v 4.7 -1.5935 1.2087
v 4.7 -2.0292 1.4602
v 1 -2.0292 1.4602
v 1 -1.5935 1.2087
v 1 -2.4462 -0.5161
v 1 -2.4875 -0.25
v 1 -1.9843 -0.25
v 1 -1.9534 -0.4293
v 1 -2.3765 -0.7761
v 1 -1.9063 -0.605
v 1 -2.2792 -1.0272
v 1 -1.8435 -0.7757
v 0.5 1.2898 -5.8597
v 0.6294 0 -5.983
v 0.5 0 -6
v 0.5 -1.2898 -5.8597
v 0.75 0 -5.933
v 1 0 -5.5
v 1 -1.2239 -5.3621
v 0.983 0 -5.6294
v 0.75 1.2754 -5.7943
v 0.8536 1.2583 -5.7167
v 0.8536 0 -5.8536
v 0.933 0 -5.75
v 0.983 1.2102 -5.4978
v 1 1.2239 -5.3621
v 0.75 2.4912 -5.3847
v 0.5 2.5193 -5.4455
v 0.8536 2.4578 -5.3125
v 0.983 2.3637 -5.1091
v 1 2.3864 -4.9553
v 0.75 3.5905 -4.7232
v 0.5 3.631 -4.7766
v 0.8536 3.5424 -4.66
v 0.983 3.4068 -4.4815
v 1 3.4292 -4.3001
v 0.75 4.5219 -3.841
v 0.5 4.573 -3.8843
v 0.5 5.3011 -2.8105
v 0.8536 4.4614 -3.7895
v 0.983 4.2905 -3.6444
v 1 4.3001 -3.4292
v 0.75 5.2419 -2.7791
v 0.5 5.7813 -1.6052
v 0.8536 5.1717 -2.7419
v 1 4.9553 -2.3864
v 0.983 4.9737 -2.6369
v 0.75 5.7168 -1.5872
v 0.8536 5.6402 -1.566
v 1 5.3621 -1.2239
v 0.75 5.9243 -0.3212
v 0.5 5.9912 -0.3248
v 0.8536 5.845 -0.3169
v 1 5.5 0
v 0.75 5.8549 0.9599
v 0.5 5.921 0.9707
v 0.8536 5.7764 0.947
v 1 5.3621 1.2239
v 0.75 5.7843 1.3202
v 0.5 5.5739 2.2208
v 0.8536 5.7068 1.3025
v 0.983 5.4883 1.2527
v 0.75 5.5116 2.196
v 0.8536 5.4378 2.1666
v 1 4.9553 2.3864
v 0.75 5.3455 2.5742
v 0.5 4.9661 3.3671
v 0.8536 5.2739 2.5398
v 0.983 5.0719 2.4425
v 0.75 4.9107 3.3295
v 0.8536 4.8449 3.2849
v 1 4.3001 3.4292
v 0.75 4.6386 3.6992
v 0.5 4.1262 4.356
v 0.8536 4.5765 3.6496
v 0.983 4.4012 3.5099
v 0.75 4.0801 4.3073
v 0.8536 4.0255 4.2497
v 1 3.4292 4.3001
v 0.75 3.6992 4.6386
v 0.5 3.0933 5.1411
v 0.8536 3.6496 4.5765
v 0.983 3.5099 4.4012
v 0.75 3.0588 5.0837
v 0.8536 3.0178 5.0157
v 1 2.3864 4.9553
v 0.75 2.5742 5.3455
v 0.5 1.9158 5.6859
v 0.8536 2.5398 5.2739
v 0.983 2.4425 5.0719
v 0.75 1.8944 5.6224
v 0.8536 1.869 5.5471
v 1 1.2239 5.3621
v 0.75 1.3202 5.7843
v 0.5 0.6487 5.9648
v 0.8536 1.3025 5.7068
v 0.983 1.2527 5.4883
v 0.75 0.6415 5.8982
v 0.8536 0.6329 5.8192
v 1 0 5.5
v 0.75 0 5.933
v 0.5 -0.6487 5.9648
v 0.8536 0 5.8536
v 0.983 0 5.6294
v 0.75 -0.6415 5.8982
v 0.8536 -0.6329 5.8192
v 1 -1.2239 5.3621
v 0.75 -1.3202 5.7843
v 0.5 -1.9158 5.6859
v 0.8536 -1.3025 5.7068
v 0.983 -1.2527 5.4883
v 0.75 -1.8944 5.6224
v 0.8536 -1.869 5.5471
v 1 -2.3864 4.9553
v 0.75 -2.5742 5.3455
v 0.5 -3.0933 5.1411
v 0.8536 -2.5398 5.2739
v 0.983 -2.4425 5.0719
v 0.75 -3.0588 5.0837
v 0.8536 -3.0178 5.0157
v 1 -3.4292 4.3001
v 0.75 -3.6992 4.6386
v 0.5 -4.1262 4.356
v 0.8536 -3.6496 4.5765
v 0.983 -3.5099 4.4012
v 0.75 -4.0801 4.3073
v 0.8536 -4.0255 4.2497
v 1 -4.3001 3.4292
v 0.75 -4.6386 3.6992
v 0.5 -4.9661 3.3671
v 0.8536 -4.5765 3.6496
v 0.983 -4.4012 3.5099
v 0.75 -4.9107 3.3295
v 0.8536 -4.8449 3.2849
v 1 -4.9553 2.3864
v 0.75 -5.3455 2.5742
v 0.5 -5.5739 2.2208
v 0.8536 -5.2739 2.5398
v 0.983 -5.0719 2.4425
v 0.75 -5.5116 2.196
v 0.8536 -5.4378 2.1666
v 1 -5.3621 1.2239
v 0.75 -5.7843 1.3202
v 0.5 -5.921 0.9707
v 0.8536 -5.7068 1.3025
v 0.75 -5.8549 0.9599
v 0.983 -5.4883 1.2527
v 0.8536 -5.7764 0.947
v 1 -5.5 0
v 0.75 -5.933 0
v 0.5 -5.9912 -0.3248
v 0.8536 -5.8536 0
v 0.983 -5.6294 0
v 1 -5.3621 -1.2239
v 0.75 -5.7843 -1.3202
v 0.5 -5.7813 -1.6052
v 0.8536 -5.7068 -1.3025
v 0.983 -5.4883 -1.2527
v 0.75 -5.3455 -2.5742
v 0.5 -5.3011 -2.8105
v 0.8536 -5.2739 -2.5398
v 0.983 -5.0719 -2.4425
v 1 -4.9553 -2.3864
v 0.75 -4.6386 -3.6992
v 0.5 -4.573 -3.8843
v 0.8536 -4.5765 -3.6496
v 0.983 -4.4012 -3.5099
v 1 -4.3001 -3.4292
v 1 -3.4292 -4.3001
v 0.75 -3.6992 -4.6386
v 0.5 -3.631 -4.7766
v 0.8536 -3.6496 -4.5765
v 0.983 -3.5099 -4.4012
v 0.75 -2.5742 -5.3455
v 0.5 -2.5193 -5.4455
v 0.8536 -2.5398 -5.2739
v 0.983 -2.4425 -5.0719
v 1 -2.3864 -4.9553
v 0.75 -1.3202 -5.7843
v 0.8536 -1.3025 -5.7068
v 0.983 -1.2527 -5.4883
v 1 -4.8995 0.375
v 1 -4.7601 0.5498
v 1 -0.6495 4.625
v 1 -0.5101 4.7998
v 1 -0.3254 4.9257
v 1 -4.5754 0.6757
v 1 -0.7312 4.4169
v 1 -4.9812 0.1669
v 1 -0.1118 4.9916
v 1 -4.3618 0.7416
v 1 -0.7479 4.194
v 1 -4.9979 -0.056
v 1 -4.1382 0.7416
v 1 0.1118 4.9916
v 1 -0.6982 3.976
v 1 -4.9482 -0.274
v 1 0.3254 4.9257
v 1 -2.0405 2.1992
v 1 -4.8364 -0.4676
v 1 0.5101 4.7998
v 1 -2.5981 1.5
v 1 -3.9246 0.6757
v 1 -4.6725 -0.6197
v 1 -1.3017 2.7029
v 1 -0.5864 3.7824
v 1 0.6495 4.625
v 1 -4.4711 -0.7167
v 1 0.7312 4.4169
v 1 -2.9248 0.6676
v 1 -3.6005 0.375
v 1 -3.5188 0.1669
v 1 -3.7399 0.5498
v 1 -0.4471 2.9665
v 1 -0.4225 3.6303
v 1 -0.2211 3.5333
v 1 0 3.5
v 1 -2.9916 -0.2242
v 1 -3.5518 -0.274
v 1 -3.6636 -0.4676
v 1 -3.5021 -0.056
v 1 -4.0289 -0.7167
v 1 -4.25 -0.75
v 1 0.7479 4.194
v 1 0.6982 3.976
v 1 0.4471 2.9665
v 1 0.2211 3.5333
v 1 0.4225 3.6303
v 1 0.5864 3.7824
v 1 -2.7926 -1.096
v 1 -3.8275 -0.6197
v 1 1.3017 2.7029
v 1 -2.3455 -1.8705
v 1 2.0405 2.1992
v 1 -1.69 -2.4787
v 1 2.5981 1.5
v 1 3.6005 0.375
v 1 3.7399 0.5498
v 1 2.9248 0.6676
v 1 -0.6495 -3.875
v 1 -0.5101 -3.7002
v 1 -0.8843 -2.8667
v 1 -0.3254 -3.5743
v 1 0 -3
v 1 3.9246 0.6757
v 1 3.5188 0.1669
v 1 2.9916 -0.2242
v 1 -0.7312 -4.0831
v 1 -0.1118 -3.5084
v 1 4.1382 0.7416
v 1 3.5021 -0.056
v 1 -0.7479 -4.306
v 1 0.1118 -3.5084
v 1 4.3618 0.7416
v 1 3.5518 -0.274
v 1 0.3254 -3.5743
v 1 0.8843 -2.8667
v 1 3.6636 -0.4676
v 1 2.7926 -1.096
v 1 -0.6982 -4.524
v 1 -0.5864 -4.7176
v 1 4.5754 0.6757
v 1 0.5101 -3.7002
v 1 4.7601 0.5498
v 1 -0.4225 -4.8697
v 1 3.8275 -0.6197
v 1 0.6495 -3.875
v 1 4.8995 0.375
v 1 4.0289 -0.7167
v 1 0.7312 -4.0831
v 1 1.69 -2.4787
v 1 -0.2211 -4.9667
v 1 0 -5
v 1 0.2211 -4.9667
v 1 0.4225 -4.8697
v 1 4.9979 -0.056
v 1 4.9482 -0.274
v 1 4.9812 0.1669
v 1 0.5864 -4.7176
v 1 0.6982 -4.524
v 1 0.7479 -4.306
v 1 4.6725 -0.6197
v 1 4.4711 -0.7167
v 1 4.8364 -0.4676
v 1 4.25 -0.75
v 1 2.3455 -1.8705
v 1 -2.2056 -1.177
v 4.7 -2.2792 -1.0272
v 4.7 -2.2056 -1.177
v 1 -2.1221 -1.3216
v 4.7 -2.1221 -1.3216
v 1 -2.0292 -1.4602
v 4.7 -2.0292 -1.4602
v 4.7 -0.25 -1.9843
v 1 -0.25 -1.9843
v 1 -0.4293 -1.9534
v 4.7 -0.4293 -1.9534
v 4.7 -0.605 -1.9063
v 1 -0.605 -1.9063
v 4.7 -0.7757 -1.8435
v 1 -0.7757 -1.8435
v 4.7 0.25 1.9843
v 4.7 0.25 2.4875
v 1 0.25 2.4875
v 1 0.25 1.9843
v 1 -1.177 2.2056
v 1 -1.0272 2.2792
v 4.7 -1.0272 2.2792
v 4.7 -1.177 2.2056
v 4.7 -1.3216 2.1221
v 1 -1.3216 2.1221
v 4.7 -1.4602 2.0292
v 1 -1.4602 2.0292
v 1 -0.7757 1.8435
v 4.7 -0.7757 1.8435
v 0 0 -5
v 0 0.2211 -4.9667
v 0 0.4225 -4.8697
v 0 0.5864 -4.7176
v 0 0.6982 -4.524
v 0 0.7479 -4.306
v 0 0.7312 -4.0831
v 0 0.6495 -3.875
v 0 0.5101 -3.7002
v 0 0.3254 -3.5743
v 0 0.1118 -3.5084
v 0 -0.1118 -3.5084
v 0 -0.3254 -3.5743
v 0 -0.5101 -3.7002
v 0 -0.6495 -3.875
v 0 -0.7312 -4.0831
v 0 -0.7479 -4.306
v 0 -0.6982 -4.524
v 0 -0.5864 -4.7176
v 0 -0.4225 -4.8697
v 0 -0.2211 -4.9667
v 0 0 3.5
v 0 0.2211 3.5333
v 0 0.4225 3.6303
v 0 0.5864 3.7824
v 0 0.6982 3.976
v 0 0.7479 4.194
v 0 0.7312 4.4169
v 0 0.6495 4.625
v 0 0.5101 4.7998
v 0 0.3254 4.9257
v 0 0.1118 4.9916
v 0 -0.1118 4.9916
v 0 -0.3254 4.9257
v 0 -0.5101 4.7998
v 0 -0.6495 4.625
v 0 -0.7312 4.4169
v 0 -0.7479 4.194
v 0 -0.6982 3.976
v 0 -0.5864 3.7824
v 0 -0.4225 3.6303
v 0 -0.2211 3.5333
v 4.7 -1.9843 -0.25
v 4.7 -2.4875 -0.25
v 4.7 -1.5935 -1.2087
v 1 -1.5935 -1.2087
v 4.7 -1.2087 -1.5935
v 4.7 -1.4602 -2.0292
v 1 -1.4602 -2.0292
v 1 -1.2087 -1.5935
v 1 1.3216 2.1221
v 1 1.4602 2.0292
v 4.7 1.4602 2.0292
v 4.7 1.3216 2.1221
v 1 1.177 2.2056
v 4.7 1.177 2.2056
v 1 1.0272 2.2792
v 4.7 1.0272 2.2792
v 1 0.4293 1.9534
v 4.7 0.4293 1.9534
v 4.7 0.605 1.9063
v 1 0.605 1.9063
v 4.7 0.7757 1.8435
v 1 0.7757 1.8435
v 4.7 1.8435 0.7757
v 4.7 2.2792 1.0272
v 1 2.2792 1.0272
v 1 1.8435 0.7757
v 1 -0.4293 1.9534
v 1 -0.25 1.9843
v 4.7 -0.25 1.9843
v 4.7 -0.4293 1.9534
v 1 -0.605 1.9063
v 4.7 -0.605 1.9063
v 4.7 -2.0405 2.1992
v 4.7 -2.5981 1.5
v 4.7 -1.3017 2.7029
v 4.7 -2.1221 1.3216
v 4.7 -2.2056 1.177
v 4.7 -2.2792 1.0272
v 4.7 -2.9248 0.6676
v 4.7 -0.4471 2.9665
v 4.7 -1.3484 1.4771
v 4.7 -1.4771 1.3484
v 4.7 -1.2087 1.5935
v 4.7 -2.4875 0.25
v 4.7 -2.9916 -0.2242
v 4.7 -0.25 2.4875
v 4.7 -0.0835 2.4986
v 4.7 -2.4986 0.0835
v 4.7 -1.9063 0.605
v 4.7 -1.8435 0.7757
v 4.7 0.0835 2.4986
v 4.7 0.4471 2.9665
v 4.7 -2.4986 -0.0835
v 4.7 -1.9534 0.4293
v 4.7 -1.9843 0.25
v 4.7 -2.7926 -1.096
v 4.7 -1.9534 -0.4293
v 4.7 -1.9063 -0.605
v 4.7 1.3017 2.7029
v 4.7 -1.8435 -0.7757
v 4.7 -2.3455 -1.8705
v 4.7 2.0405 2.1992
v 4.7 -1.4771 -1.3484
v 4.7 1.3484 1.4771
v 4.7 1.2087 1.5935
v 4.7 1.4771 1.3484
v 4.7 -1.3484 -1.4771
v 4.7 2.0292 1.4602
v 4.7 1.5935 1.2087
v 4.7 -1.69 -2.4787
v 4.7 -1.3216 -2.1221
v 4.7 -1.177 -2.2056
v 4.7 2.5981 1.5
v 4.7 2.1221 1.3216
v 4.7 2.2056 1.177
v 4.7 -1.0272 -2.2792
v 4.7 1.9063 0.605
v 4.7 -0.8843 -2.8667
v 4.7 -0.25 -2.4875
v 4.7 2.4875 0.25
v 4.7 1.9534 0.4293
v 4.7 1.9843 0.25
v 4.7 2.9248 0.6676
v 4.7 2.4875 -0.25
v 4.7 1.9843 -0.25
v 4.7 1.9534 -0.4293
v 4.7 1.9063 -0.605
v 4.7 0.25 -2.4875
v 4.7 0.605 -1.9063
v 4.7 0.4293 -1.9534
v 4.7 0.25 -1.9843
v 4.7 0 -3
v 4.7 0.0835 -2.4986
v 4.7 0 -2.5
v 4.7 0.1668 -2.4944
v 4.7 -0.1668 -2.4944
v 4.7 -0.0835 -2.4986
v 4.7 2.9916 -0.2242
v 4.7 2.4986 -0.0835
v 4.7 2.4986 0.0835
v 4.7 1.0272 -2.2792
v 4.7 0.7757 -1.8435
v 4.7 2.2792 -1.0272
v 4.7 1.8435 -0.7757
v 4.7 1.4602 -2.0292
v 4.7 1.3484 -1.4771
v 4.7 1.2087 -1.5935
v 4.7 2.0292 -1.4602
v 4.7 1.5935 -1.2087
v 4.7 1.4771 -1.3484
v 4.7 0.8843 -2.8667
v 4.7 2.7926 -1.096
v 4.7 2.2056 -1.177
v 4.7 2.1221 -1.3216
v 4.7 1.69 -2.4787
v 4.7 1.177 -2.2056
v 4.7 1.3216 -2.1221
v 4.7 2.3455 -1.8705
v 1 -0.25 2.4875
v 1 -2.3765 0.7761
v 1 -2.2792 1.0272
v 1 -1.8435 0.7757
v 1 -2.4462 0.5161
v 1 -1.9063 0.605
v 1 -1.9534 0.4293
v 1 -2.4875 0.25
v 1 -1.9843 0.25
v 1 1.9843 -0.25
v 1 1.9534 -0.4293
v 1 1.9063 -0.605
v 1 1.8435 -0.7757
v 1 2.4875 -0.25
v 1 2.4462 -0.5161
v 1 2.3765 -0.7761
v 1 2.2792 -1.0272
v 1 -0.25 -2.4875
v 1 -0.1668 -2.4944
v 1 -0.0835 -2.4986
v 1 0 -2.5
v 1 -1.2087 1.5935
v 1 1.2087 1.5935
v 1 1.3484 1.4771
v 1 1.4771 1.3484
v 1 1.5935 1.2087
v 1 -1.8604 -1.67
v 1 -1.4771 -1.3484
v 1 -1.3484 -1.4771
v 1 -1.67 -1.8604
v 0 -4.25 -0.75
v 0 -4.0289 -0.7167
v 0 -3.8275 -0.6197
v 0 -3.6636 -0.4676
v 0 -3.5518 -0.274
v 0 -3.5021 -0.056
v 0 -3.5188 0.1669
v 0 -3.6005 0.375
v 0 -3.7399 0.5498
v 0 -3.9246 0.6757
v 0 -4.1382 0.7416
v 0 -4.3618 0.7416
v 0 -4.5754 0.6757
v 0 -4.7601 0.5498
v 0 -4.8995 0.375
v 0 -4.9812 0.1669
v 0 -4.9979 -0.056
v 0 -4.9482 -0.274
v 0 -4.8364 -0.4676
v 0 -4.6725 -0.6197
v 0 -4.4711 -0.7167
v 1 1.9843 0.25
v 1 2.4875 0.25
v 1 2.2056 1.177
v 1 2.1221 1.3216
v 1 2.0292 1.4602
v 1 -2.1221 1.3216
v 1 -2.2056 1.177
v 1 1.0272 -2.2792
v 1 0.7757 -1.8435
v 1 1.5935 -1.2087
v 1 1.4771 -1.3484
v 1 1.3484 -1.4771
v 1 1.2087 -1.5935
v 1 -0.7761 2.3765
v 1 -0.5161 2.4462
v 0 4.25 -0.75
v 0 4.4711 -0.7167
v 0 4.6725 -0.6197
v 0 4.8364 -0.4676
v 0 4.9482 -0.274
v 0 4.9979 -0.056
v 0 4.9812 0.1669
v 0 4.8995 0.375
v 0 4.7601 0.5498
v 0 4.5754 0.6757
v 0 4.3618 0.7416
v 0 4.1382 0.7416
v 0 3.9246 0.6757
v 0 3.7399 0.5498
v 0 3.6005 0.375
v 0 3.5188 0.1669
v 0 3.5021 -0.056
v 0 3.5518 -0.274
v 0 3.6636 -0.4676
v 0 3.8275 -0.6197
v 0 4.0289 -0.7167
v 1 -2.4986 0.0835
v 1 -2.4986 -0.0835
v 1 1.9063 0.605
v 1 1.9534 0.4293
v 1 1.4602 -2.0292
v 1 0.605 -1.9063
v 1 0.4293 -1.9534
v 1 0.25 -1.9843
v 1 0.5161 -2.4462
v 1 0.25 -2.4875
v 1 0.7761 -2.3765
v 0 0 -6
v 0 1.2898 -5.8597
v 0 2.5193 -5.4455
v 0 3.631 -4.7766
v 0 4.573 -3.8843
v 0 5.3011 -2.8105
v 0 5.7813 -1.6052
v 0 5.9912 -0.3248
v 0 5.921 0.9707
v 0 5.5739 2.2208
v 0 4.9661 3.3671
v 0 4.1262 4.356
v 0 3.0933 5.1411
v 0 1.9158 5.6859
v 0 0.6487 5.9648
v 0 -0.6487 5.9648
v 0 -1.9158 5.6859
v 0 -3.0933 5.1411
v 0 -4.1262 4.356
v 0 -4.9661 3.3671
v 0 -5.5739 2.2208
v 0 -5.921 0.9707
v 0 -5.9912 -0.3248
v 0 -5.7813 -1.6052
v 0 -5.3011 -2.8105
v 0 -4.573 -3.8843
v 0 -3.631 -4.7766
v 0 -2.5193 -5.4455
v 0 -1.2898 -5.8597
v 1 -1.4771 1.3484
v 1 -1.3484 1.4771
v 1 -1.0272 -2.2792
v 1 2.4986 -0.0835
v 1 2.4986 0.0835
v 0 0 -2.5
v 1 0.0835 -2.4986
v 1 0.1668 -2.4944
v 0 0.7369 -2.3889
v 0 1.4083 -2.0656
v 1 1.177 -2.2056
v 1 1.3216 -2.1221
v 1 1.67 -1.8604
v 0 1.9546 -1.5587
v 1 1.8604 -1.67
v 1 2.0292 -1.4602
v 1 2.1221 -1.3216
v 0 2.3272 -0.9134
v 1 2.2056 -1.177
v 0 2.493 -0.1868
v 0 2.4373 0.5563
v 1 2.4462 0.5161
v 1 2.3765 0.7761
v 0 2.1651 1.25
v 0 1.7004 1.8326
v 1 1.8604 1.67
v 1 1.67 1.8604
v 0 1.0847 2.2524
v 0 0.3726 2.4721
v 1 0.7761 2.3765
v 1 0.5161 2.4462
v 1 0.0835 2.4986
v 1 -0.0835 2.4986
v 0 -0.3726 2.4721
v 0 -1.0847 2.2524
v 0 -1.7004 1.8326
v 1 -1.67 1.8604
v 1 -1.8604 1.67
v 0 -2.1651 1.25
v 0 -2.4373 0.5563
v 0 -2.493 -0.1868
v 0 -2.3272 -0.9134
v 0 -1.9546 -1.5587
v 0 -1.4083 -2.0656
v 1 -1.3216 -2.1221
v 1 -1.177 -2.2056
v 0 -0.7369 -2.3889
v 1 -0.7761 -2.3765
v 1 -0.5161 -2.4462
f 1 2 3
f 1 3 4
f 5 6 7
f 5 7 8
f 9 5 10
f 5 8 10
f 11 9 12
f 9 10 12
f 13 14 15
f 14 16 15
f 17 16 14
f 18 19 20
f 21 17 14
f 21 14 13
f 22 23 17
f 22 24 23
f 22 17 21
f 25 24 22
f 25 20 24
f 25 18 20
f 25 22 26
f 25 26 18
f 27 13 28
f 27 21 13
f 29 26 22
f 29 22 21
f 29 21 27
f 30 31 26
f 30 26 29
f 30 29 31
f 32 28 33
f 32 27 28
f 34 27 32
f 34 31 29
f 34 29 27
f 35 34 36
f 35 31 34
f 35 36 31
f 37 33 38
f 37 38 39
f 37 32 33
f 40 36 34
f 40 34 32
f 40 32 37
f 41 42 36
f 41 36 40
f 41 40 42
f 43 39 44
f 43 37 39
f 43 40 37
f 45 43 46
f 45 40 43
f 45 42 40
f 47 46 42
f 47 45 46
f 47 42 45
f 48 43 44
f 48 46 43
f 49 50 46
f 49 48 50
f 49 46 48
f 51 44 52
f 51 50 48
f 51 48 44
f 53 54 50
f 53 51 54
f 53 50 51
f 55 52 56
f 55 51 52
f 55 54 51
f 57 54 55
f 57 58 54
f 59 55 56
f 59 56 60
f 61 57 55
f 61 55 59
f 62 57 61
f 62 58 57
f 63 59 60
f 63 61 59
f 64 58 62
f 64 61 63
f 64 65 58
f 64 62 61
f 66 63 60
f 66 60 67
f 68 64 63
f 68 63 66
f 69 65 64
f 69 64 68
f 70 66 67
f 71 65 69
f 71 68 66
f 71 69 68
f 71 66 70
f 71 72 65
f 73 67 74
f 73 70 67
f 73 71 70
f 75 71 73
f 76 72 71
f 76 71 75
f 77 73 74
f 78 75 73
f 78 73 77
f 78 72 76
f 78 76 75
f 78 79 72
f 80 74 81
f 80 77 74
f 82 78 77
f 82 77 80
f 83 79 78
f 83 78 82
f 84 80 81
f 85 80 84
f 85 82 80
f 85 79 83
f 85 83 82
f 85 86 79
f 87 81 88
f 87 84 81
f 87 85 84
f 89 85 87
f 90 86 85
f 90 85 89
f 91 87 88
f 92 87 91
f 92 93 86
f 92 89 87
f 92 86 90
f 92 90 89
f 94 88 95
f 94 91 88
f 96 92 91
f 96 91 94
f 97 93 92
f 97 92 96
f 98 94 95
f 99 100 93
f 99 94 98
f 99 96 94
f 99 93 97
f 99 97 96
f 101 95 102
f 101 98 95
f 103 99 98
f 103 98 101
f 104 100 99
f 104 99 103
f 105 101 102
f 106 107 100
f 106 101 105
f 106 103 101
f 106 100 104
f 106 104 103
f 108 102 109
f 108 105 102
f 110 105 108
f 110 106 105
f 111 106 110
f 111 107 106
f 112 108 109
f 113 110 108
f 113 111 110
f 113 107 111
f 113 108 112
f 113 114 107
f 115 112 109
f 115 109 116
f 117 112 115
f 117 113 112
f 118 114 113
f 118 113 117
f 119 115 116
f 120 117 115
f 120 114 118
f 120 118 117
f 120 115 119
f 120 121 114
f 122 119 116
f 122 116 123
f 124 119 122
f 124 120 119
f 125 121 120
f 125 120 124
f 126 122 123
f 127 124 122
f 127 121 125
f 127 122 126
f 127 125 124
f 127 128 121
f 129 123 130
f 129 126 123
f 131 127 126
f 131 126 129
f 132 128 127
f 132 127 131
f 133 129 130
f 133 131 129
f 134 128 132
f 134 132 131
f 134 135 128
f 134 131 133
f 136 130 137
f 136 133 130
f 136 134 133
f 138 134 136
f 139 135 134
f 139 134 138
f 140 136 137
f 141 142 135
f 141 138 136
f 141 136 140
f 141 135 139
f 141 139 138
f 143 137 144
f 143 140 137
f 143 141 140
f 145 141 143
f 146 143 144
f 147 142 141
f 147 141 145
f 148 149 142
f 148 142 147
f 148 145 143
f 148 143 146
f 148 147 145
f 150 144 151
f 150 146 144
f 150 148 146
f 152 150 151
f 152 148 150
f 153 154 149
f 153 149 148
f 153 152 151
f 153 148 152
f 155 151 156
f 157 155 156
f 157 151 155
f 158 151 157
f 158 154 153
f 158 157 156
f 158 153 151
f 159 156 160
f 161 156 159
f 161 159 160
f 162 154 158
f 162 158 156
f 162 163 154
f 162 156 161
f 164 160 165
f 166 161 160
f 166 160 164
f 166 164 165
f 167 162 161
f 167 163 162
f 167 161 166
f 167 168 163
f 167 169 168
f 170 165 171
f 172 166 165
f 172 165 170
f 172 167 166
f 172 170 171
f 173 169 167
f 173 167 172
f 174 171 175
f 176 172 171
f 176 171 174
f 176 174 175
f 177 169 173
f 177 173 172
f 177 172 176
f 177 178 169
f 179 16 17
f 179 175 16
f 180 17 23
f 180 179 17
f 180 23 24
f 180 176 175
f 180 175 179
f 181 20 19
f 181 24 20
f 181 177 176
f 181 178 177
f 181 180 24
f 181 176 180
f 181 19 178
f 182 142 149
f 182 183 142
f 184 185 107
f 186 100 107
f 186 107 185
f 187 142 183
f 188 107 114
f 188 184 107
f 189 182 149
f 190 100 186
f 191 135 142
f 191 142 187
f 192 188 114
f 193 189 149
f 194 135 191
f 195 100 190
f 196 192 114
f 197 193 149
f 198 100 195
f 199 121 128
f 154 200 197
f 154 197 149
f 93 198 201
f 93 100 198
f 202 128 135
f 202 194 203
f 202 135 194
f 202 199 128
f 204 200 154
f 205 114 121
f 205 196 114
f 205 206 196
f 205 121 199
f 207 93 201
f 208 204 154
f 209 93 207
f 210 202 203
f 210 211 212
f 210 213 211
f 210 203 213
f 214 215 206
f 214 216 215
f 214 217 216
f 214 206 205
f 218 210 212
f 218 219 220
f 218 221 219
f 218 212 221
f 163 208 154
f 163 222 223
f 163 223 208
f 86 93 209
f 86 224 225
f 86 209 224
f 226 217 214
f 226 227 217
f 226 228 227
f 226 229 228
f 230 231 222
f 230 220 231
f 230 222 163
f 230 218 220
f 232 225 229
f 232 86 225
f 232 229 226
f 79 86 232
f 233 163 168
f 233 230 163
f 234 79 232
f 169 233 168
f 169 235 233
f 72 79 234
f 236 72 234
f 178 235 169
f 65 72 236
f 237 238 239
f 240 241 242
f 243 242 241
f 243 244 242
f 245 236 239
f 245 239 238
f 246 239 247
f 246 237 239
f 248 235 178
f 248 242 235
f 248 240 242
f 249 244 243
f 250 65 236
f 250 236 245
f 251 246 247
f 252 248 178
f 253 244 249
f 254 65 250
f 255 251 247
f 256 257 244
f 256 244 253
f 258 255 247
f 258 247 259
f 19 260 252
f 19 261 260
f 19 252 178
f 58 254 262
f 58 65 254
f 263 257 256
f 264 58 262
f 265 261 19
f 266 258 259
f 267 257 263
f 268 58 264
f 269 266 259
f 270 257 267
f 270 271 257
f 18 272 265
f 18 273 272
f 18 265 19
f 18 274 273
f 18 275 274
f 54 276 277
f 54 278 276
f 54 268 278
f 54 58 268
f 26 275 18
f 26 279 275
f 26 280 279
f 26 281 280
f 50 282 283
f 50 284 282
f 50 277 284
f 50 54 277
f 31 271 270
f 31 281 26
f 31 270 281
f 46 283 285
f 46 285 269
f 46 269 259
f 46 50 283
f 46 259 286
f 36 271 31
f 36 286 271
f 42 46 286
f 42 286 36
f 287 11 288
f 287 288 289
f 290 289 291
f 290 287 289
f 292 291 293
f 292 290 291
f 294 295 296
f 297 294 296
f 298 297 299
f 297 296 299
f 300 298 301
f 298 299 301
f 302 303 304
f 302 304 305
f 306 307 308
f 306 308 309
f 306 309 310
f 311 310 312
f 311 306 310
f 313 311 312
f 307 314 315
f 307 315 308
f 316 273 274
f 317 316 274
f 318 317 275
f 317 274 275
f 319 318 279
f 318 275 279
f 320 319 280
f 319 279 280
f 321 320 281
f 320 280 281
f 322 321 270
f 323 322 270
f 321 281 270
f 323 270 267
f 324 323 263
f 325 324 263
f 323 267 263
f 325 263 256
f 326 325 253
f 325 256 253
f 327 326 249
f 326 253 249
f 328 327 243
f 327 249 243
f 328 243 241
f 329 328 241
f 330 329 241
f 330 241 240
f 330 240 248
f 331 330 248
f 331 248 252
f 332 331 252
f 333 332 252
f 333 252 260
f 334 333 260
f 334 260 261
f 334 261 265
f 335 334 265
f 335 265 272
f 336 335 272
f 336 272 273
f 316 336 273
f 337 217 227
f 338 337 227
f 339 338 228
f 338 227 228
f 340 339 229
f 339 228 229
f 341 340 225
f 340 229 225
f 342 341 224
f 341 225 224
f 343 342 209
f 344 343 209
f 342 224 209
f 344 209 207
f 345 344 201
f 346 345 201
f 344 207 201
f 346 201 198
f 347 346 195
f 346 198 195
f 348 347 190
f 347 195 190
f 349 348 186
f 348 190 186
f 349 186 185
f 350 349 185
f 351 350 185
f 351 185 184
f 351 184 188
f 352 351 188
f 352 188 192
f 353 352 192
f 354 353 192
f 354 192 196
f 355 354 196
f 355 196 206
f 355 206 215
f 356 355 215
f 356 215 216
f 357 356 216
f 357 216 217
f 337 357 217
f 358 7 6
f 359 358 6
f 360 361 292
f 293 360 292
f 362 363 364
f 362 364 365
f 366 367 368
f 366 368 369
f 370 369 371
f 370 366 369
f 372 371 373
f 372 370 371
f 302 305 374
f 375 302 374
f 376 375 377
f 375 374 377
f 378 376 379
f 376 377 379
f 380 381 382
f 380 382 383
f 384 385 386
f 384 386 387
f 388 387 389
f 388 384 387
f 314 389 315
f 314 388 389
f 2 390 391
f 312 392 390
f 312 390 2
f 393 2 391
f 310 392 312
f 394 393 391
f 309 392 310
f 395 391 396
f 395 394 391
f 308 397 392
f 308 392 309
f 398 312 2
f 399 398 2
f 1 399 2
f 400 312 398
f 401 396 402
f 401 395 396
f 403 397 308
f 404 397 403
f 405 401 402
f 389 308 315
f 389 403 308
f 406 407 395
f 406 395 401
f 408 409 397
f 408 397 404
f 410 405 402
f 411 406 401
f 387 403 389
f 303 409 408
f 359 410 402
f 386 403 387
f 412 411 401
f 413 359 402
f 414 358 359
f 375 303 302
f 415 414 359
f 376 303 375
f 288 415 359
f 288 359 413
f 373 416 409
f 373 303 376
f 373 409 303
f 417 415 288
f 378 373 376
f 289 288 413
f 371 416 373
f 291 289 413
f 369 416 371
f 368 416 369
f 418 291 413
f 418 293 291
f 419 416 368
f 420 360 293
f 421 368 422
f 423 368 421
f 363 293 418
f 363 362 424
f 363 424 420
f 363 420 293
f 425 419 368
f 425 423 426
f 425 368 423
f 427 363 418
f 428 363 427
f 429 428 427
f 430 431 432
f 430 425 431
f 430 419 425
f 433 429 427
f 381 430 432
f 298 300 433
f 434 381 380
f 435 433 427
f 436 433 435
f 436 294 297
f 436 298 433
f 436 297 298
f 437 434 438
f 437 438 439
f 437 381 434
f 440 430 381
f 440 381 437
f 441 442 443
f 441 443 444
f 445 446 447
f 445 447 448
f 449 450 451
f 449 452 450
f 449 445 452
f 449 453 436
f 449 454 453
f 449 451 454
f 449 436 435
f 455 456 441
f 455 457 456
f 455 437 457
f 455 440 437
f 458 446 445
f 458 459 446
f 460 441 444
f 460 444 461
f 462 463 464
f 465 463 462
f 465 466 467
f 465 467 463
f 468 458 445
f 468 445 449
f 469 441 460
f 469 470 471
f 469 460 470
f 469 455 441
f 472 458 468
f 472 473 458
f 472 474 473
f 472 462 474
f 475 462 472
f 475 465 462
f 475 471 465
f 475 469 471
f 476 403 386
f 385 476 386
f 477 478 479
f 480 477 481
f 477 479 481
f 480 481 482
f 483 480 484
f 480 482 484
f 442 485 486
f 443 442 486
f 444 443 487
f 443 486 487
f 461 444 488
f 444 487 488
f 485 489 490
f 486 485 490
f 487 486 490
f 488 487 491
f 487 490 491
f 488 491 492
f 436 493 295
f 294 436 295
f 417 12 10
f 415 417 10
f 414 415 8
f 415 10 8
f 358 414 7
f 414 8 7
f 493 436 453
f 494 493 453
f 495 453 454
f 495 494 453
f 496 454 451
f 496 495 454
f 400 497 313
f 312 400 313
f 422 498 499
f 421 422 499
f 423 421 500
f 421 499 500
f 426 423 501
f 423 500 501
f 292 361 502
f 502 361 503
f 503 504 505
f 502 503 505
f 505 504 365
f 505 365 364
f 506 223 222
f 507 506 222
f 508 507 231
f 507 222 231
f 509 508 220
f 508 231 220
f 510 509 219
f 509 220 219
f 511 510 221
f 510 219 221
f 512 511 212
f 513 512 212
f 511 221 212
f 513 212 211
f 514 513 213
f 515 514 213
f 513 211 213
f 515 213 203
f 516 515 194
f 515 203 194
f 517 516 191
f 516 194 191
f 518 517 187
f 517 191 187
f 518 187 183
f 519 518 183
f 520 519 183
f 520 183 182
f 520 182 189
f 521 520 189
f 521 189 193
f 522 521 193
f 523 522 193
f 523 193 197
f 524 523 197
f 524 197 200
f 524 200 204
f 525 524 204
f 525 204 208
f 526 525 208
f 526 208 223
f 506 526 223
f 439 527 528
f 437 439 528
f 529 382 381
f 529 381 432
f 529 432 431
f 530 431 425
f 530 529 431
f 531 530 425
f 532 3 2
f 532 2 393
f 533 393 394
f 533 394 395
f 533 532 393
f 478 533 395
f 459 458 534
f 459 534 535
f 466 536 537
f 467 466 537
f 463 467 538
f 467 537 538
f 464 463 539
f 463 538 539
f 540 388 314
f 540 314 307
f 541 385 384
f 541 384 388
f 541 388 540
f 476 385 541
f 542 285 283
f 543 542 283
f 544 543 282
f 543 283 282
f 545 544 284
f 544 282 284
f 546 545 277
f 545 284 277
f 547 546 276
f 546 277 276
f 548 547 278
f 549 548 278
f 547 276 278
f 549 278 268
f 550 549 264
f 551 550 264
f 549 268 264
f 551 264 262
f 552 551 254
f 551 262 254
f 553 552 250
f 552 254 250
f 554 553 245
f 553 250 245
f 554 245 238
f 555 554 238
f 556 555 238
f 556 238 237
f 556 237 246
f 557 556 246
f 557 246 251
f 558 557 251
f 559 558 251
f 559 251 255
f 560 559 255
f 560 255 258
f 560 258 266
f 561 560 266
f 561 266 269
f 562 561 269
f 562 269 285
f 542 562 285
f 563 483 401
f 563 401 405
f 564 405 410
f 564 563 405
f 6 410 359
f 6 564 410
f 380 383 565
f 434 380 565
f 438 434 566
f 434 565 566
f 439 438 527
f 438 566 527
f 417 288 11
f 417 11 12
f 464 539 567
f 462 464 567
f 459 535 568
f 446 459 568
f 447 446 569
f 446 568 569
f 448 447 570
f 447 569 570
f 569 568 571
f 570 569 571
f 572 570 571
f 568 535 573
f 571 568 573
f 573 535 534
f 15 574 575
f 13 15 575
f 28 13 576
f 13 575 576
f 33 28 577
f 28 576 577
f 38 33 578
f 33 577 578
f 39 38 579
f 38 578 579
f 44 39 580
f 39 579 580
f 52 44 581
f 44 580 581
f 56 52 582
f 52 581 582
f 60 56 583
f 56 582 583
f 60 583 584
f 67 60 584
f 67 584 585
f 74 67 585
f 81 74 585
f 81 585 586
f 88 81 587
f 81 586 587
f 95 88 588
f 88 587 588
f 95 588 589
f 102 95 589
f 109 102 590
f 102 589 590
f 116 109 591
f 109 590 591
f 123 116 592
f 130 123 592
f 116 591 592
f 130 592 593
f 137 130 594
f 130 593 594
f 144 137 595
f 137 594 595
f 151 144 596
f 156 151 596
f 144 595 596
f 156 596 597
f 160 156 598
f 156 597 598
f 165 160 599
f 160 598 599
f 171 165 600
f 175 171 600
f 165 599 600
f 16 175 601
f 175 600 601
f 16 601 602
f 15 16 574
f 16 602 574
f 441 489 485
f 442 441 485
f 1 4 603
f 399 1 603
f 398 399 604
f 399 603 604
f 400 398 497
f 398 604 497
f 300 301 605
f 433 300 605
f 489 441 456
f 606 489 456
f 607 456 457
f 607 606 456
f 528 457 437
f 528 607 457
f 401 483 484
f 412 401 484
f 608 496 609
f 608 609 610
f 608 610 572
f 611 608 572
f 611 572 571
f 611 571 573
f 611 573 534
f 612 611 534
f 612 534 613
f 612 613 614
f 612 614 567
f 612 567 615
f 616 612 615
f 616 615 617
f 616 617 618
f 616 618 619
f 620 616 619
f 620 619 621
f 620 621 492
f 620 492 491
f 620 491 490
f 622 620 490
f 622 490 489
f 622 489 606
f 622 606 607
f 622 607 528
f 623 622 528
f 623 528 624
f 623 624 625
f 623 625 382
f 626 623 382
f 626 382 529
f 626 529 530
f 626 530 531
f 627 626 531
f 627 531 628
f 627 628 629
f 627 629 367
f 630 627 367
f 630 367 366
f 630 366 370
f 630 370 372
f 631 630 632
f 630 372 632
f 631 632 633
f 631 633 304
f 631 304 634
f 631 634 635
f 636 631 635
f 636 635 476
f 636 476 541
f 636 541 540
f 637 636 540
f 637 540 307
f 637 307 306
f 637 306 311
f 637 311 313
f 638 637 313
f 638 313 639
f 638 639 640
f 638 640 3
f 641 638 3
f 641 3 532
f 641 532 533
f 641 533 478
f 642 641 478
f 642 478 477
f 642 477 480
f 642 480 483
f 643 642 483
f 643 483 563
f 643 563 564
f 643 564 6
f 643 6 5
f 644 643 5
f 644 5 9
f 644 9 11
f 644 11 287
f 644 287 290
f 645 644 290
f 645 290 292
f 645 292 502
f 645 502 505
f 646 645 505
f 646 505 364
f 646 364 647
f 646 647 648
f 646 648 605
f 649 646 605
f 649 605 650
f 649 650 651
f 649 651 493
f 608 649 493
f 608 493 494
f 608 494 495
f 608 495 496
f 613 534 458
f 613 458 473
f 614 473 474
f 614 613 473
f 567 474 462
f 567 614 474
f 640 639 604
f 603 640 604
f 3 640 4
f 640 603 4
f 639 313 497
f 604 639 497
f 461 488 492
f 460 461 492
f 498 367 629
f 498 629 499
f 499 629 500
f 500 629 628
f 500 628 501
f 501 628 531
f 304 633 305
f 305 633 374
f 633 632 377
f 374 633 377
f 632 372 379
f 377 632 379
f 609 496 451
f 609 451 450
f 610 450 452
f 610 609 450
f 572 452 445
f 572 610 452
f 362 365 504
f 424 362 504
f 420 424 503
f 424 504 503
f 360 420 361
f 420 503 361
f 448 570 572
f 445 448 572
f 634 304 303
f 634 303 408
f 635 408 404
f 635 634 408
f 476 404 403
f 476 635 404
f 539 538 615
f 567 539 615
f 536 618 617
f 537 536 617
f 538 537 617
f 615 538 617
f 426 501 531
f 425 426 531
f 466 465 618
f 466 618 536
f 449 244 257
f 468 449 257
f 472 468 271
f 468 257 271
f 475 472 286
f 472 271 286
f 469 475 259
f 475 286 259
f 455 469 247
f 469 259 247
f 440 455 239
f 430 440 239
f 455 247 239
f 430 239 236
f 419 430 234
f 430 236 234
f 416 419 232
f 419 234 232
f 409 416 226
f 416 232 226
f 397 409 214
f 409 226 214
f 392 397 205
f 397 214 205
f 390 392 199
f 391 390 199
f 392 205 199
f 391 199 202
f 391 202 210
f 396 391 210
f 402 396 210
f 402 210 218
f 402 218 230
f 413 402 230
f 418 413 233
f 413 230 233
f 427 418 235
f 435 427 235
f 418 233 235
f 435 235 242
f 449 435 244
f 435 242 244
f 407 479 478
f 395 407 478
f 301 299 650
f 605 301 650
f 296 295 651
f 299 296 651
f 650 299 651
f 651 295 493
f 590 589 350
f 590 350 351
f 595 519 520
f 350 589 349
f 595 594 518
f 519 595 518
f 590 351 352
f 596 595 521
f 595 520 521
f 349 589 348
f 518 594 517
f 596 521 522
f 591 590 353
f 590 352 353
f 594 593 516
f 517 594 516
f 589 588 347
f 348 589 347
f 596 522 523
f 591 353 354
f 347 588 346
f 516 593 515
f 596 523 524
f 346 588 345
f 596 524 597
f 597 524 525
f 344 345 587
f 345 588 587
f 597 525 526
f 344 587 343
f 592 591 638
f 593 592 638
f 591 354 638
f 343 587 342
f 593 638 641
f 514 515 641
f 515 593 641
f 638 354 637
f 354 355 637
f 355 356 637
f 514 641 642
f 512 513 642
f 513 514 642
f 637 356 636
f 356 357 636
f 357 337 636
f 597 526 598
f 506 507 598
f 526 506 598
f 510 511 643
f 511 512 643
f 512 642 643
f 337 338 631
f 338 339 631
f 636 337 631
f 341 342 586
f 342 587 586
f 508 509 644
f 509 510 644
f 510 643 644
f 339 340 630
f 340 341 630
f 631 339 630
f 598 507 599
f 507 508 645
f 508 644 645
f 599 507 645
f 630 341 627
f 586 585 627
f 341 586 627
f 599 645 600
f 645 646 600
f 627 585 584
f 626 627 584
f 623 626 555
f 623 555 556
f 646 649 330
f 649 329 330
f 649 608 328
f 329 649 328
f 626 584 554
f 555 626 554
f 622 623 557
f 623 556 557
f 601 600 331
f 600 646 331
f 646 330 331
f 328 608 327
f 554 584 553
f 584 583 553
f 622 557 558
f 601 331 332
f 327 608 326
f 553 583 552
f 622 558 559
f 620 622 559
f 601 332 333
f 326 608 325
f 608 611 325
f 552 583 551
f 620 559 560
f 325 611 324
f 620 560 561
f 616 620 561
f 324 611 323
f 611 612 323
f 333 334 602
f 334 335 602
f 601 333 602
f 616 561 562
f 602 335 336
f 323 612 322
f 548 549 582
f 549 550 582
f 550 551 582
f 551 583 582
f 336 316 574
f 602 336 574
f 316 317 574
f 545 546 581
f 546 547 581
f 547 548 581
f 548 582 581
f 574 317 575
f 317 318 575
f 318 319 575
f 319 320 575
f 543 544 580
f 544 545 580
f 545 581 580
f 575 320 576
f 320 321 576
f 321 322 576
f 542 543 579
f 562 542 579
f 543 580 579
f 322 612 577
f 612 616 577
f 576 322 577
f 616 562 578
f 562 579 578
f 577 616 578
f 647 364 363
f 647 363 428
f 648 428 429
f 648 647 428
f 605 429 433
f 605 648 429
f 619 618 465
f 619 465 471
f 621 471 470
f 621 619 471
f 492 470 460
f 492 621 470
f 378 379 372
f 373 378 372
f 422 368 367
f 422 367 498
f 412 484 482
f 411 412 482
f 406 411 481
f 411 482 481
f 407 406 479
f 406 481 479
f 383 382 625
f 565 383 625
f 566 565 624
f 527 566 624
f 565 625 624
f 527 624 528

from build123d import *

# Parameters (mm, degrees)
SKETCH1_R           = 6
BOSS_EXTRUDE1_DEPTH = 1
FILLET2_R           = 0.5
SKETCH3_R           = 3
SKETCH3_R_2         = 2.5
BOSS_EXTRUDE2_DEPTH = 3.7
SKETCH4_R           = 2.5
CUT_EXTRUDE1_DEPTH  = 10.256889391
BOSS_EXTRUDE3_DEPTH = 3.7
SKETCH6_R           = 0.75
CUT_EXTRUDE2_DEPTH  = 10.256889391


with BuildPart() as part:
    # Sketch1 → Boss-Extrude1 (new body)
    with BuildSketch(Plane(origin=(0, 0, 0), x_dir=(0, 0, -1), z_dir=(1, 0, 0))):
        Circle(SKETCH1_R)
    extrude(amount=BOSS_EXTRUDE1_DEPTH)

    # Fillet2
    fillet2_edges = [part.edges().sort_by_distance(p)[0] for p in [
        (1, 0, 6),
    ]]
    fillet(fillet2_edges, radius=FILLET2_R)

    # Sketch3 → Boss-Extrude2 (add)
    with BuildSketch(Plane(origin=(1, 0, 0), x_dir=(0, 0, -1), z_dir=(1, 0, 0))):
        Circle(SKETCH3_R)
        Circle(SKETCH3_R_2, mode=Mode.SUBTRACT)
    extrude(amount=BOSS_EXTRUDE2_DEPTH)

    # Sketch4 → Cut-Extrude1 (cut, through all)
    with BuildSketch(Plane(origin=(1, 0, 0), x_dir=(0, 0, -1), z_dir=(1, 0, 0))):
        Circle(SKETCH4_R)
    extrude(amount=-CUT_EXTRUDE1_DEPTH, mode=Mode.SUBTRACT)

    # Sketch5 → Boss-Extrude3 (add, through all)
    with BuildSketch(Plane(origin=(1, 0, 0), x_dir=(0, 0, -1), z_dir=(1, 0, 0))):
        with BuildLine():
            Line((-2.537715508, 0.25), (-1.984313483, 0.25))
            ThreePointArc((-1.984313483, 0.25), (-1.931851653, 0.51763809), (-1.843465886, 0.775650391))
            Line((-1.843465886, 0.775650391), (-2.322726098, 1.052351403))
            ThreePointArc((-2.322726098, 1.052351403), (-2.463110857, 0.659988565), (-2.537715508, 0.25))
        make_face()
        with BuildLine():
            Line((-2.537715508, -0.25), (-1.984313483, -0.25))
            ThreePointArc((-1.984313483, -0.25), (-1.931851653, -0.51763809), (-1.843465886, -0.775650391))
            Line((-1.843465886, -0.775650391), (-2.322726098, -1.052351403))
            ThreePointArc((-2.322726098, -1.052351403), (-2.463110857, -0.659988565), (-2.537715508, -0.25))
        make_face()
        with BuildLine():
            Line((-2.072726098, 1.485364105), (-1.593465886, 1.208663093))
            ThreePointArc((-1.593465886, 1.208663093), (-1.414213562, 1.414213562), (-1.208663093, 1.593465886))
            Line((-1.208663093, 1.593465886), (-1.485364105, 2.072726098))
            ThreePointArc((-1.485364105, 2.072726098), (-1.803122292, 1.803122292), (-2.072726098, 1.485364105))
        make_face()
        with BuildLine():
            Line((-1.052351403, 2.322726098), (-0.775650391, 1.843465886))
            ThreePointArc((-0.775650391, 1.843465886), (-0.51763809, 1.931851653), (-0.25, 1.984313483))
            Line((-0.25, 1.984313483), (-0.25, 2.537715508))
            ThreePointArc((-0.25, 2.537715508), (-0.659988565, 2.463110857), (-1.052351403, 2.322726098))
        make_face()
        with BuildLine():
            Line((0.25, 2.537715508), (0.25, 1.984313483))
            ThreePointArc((0.25, 1.984313483), (0.51763809, 1.931851653), (0.775650391, 1.843465886))
            Line((0.775650391, 1.843465886), (1.052351403, 2.322726098))
            ThreePointArc((1.052351403, 2.322726098), (0.659988565, 2.463110857), (0.25, 2.537715508))
        make_face()
        with BuildLine():
            Line((1.485364105, 2.072726098), (1.208663093, 1.593465886))
            ThreePointArc((1.208663093, 1.593465886), (1.414213562, 1.414213562), (1.593465886, 1.208663093))
            Line((1.593465886, 1.208663093), (2.072726098, 1.485364105))
            ThreePointArc((2.072726098, 1.485364105), (1.803122292, 1.803122292), (1.485364105, 2.072726098))
        make_face()
        with BuildLine():
            Line((2.322726098, 1.052351403), (1.843465886, 0.775650391))
            ThreePointArc((1.843465886, 0.775650391), (1.931851653, 0.51763809), (1.984313483, 0.25))
            Line((1.984313483, 0.25), (2.537715508, 0.25))
            ThreePointArc((2.537715508, 0.25), (2.463110857, 0.659988565), (2.322726098, 1.052351403))
        make_face()
        with BuildLine():
            Line((2.537715508, -0.25), (1.984313483, -0.25))
            ThreePointArc((1.984313483, -0.25), (1.931851653, -0.51763809), (1.843465886, -0.775650391))
            Line((1.843465886, -0.775650391), (2.322726098, -1.052351403))
            ThreePointArc((2.322726098, -1.052351403), (2.463110857, -0.659988565), (2.537715508, -0.25))
        make_face()
        with BuildLine():
            Line((2.072726098, -1.485364105), (1.593465886, -1.208663093))
            ThreePointArc((1.593465886, -1.208663093), (1.414213562, -1.414213562), (1.208663093, -1.593465886))
            Line((1.208663093, -1.593465886), (1.485364105, -2.072726098))
            ThreePointArc((1.485364105, -2.072726098), (1.803122292, -1.803122292), (2.072726098, -1.485364105))
        make_face()
        with BuildLine():
            Line((1.052351403, -2.322726098), (0.775650391, -1.843465886))
            ThreePointArc((0.775650391, -1.843465886), (0.51763809, -1.931851653), (0.25, -1.984313483))
            Line((0.25, -1.984313483), (0.25, -2.537715508))
            ThreePointArc((0.25, -2.537715508), (0.659988565, -2.463110857), (1.052351403, -2.322726098))
        make_face()
        with BuildLine():
            Line((-0.25, -2.537715508), (-0.25, -1.984313483))
            ThreePointArc((-0.25, -1.984313483), (-0.51763809, -1.931851653), (-0.775650391, -1.843465886))
            Line((-0.775650391, -1.843465886), (-1.052351403, -2.322726098))
            ThreePointArc((-1.052351403, -2.322726098), (-0.659988565, -2.463110857), (-0.25, -2.537715508))
        make_face()
        with BuildLine():
            Line((-1.485364105, -2.072726098), (-1.208663093, -1.593465886))
            ThreePointArc((-1.208663093, -1.593465886), (-1.414213562, -1.414213562), (-1.593465886, -1.208663093))
            Line((-1.593465886, -1.208663093), (-2.072726098, -1.485364105))
            ThreePointArc((-2.072726098, -1.485364105), (-1.803122292, -1.803122292), (-1.485364105, -2.072726098))
        make_face()
    extrude(amount=BOSS_EXTRUDE3_DEPTH)

    # Sketch6 → Cut-Extrude2 (cut, through all)
    with BuildSketch(Plane(origin=(1, 0, 0), x_dir=(0, 0, -1), z_dir=(1, 0, 0))):
        with Locations((-4.25, 0)):
            Circle(SKETCH6_R)
        with Locations((0, 4.25)):
            Circle(SKETCH6_R)
        with Locations((4.25, 0)):
            Circle(SKETCH6_R)
        with Locations((0, -4.25)):
            Circle(SKETCH6_R)
    extrude(amount=-CUT_EXTRUDE2_DEPTH, mode=Mode.SUBTRACT)


solid = part.part
